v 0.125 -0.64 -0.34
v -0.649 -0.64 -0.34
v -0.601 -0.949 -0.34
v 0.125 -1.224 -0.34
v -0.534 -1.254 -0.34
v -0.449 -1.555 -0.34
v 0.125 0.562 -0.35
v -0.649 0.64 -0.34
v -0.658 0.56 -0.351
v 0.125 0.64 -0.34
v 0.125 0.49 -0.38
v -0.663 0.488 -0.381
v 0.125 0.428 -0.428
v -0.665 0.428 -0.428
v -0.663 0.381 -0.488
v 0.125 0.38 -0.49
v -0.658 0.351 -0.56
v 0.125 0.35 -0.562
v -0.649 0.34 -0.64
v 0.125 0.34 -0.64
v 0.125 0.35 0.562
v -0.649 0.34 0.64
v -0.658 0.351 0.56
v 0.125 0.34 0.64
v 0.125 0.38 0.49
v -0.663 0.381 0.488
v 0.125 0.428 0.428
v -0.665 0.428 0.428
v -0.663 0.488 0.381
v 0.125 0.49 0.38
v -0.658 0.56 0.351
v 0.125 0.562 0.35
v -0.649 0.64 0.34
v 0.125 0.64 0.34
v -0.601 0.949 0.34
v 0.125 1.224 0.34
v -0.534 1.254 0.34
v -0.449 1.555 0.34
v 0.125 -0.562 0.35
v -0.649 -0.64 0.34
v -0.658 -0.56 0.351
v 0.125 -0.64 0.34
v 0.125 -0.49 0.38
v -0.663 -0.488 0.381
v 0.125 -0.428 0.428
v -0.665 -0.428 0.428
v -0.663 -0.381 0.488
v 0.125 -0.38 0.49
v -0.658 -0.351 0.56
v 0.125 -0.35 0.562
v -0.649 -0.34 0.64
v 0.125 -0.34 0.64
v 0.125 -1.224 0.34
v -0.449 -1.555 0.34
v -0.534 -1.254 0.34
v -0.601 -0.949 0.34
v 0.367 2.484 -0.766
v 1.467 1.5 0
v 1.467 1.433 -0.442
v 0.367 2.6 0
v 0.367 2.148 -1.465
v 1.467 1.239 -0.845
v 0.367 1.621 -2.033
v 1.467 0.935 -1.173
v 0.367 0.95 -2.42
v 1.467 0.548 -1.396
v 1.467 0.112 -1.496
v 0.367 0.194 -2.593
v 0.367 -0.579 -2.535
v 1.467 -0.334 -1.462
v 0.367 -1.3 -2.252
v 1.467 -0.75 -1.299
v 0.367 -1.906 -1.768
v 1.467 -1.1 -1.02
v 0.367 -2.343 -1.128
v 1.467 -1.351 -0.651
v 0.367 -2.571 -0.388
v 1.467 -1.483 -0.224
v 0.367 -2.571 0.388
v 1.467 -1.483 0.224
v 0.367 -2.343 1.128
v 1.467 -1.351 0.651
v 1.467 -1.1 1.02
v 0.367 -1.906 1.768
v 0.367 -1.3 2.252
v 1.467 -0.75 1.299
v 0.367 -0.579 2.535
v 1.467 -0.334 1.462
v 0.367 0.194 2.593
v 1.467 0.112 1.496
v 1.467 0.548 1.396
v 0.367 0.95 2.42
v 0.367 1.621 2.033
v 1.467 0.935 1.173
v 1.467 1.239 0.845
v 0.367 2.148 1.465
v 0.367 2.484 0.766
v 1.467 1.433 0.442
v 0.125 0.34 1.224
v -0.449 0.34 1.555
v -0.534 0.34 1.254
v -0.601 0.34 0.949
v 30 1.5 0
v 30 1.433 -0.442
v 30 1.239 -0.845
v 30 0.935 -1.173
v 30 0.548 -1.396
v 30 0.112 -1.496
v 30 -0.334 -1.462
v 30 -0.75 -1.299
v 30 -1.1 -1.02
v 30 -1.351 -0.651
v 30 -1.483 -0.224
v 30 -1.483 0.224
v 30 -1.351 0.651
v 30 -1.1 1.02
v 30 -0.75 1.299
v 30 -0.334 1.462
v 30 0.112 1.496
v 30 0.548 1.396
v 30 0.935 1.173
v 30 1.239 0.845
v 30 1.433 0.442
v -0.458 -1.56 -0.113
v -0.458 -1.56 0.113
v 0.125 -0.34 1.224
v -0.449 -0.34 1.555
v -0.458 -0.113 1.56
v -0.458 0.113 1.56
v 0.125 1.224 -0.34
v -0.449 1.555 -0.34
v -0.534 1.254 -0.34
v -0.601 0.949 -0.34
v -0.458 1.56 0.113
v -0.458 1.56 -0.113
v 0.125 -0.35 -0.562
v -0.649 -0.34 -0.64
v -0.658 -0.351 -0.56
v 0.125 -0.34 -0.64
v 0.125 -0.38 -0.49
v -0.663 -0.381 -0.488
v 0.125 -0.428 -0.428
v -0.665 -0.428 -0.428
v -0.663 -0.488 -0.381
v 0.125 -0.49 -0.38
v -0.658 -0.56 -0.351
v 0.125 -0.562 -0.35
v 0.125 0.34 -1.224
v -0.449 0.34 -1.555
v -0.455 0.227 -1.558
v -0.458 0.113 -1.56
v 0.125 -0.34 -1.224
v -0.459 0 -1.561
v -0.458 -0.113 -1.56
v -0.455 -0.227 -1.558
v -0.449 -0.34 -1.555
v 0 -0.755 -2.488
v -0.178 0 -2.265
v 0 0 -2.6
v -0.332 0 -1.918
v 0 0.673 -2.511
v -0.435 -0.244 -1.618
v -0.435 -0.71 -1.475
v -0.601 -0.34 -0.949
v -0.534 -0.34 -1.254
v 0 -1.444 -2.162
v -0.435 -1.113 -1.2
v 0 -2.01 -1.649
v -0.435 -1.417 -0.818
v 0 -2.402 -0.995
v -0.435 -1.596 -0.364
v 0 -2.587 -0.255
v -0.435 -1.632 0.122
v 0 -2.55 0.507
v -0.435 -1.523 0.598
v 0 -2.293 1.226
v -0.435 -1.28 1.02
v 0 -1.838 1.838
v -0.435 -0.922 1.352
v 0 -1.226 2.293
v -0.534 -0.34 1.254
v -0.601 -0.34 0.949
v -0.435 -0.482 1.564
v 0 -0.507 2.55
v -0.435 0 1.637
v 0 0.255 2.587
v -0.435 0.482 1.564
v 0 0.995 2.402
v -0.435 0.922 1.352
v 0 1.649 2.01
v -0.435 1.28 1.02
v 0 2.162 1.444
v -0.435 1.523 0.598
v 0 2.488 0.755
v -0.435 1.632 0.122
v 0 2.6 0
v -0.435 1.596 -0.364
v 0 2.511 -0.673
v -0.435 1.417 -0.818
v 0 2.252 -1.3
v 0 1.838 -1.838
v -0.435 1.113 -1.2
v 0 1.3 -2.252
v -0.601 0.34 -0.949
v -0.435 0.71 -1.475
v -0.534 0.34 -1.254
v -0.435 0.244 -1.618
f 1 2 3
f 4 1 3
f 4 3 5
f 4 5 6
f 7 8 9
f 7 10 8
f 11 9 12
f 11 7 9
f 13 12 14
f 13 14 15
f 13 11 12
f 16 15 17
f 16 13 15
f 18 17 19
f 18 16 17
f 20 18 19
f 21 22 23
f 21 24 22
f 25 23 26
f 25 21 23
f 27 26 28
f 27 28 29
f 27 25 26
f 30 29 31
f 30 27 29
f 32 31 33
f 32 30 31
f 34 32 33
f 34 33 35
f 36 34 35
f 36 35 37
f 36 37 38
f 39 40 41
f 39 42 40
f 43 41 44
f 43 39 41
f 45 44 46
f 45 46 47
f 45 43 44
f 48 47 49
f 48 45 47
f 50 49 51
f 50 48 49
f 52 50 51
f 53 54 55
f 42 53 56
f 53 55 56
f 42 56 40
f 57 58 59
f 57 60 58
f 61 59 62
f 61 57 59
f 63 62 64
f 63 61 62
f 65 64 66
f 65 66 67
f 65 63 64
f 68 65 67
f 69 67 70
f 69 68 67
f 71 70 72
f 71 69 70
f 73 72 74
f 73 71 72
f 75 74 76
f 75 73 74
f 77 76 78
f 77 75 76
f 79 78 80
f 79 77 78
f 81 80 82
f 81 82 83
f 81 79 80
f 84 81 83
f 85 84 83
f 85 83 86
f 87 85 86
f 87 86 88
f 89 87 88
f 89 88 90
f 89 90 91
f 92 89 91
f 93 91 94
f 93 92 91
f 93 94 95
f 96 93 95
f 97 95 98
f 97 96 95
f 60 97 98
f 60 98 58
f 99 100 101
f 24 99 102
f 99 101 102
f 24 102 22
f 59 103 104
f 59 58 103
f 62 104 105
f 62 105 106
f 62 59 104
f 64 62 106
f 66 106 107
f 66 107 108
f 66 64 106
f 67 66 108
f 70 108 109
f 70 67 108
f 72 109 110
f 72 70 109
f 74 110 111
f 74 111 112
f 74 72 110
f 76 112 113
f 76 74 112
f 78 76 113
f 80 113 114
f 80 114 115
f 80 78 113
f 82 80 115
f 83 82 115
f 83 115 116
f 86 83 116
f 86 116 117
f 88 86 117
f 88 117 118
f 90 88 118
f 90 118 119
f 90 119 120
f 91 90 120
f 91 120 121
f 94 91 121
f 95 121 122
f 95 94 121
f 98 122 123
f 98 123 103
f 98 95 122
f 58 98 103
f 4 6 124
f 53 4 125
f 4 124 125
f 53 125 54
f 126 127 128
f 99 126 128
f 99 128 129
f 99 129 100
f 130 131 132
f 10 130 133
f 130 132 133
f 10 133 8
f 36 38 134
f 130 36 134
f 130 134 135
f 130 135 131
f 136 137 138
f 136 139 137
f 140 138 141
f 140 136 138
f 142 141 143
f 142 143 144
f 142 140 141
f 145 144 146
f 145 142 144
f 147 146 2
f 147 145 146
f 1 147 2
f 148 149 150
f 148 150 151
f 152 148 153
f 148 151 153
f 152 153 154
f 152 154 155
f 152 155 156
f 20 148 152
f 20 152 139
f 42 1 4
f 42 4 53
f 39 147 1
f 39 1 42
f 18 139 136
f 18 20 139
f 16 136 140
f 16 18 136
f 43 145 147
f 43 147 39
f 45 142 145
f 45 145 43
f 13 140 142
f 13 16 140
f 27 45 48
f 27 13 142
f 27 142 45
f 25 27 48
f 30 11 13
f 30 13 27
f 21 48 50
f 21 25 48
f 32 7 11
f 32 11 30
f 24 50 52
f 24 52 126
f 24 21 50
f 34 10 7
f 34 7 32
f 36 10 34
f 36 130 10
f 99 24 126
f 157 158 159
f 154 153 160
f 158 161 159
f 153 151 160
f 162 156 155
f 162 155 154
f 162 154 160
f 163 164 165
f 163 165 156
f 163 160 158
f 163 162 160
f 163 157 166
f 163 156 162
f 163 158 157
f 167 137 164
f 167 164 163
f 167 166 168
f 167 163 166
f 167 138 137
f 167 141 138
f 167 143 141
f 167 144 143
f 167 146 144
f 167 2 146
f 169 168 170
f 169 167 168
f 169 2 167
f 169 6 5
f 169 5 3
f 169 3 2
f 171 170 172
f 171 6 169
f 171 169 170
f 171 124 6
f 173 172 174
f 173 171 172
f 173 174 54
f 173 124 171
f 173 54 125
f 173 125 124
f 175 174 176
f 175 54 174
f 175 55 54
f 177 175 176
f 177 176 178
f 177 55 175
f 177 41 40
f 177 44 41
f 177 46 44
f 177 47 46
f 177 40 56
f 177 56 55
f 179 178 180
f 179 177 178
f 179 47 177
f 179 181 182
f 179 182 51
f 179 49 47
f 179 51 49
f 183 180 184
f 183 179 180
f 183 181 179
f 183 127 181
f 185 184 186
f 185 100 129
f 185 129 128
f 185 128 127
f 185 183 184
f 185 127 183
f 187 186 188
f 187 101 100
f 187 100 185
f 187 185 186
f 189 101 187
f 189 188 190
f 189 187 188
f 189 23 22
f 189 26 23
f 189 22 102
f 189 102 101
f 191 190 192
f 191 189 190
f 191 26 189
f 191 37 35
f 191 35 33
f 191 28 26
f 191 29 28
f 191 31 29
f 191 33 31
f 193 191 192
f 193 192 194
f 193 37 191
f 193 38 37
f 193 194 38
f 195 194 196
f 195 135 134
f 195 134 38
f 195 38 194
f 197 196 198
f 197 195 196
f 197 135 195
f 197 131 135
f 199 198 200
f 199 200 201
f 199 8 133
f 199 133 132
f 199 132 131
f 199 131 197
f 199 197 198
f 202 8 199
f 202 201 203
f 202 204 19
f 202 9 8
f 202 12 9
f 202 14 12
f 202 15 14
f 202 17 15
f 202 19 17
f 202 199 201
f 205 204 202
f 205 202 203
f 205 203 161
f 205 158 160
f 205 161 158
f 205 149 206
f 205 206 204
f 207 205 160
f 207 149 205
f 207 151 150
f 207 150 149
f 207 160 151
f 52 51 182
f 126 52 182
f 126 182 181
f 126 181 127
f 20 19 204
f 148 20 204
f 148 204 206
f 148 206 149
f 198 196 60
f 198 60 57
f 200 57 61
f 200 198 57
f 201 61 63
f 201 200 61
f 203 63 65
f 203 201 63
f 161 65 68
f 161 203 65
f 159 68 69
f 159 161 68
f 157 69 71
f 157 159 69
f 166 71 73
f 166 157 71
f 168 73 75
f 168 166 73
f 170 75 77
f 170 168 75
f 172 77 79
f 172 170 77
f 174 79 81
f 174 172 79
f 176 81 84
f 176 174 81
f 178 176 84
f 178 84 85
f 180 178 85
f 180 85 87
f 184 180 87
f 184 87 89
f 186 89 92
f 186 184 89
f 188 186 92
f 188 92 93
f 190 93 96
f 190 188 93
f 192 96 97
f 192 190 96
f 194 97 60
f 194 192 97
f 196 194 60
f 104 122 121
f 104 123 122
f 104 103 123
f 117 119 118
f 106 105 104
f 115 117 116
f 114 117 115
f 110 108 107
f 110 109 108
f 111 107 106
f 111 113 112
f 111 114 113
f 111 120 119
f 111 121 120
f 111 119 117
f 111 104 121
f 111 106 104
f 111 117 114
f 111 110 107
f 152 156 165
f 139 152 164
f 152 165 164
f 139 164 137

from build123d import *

# Parameters (mm, degrees)
BASETOP_FACE_RADIUS = 2.6
BASETOP_HEIGHT      = 0.7
CROSSRECESS_DEPTH   = 0.825
DRAFT9_ANGLE        = -30
FILLET5_R           = 0.3


with BuildPart() as part:
    # Sketch1 → Base (revolve)
    with BuildSketch(Plane.XY):
        Polygon((30, 1.5), (2.737867966, 1.5), (1.467367966, 1.5), (0.367367966, 2.6), (0, 2.6), (0, 0), (30, 0), align=None)
    revolve(axis=Axis((4.515812911, 0, 0), (-1, 0, 0)))

    # BaseTop: a dome of height H over a round flat face of radius A is a cap of a sphere of radius (A * A + H * H) / (2 * H)
    basetop_r = (BASETOP_FACE_RADIUS * BASETOP_FACE_RADIUS + BASETOP_HEIGHT * BASETOP_HEIGHT) / (2 * BASETOP_HEIGHT)
    basetop_base = Plane((0, 0, 0), z_dir=(-1, 0, 0))
    with Locations(basetop_base.offset(BASETOP_HEIGHT - basetop_r)):
        basetop_ball = Sphere(basetop_r, mode=Mode.PRIVATE)
    add(split(basetop_ball, bisect_by=basetop_base, keep=Keep.TOP, mode=Mode.PRIVATE))

    # Sketch6 → CrossRecess (cut)
    with BuildSketch(Plane.ZY.offset(0.7)):
        Polygon((0.34, 0.34), (0.34, 1.7), (-0.34, 1.7), (-0.34, 0.34), (-1.7, 0.34), (-1.7, -0.34), (-0.34, -0.34), (-0.34, -1.7), (0.34, -1.7), (0.34, -0.34), (1.7, -0.34), (1.7, 0.34), align=None)
    extrude(amount=-CROSSRECESS_DEPTH, mode=Mode.SUBTRACT)

    # Draft9
    draft9_faces = [part.faces().sort_by_distance(p)[0] for p in [
        (-0.14204754, 0, -1.7),
        (-0.14204754, -1.7, 0),
        (-0.14204754, 0, 1.7),
        (-0.14204754, 1.7, 0),
    ]]
    draft(draft9_faces, Plane(origin=(-0.7, 0, 0), x_dir=(0, 0, 1), z_dir=(1, 0, 0)), DRAFT9_ANGLE)

    # Fillet5
    fillet5_edges = [part.edges().sort_by_distance(p)[0] for p in [
        (-0.27631446, 0.34, -0.34),
        (-0.27631446, 0.34, 0.34),
        (-0.27631446, -0.34, 0.34),
        (-0.27631446, -0.34, -0.34),
    ]]
    fillet(fillet5_edges, radius=FILLET5_R)


solid = part.part
